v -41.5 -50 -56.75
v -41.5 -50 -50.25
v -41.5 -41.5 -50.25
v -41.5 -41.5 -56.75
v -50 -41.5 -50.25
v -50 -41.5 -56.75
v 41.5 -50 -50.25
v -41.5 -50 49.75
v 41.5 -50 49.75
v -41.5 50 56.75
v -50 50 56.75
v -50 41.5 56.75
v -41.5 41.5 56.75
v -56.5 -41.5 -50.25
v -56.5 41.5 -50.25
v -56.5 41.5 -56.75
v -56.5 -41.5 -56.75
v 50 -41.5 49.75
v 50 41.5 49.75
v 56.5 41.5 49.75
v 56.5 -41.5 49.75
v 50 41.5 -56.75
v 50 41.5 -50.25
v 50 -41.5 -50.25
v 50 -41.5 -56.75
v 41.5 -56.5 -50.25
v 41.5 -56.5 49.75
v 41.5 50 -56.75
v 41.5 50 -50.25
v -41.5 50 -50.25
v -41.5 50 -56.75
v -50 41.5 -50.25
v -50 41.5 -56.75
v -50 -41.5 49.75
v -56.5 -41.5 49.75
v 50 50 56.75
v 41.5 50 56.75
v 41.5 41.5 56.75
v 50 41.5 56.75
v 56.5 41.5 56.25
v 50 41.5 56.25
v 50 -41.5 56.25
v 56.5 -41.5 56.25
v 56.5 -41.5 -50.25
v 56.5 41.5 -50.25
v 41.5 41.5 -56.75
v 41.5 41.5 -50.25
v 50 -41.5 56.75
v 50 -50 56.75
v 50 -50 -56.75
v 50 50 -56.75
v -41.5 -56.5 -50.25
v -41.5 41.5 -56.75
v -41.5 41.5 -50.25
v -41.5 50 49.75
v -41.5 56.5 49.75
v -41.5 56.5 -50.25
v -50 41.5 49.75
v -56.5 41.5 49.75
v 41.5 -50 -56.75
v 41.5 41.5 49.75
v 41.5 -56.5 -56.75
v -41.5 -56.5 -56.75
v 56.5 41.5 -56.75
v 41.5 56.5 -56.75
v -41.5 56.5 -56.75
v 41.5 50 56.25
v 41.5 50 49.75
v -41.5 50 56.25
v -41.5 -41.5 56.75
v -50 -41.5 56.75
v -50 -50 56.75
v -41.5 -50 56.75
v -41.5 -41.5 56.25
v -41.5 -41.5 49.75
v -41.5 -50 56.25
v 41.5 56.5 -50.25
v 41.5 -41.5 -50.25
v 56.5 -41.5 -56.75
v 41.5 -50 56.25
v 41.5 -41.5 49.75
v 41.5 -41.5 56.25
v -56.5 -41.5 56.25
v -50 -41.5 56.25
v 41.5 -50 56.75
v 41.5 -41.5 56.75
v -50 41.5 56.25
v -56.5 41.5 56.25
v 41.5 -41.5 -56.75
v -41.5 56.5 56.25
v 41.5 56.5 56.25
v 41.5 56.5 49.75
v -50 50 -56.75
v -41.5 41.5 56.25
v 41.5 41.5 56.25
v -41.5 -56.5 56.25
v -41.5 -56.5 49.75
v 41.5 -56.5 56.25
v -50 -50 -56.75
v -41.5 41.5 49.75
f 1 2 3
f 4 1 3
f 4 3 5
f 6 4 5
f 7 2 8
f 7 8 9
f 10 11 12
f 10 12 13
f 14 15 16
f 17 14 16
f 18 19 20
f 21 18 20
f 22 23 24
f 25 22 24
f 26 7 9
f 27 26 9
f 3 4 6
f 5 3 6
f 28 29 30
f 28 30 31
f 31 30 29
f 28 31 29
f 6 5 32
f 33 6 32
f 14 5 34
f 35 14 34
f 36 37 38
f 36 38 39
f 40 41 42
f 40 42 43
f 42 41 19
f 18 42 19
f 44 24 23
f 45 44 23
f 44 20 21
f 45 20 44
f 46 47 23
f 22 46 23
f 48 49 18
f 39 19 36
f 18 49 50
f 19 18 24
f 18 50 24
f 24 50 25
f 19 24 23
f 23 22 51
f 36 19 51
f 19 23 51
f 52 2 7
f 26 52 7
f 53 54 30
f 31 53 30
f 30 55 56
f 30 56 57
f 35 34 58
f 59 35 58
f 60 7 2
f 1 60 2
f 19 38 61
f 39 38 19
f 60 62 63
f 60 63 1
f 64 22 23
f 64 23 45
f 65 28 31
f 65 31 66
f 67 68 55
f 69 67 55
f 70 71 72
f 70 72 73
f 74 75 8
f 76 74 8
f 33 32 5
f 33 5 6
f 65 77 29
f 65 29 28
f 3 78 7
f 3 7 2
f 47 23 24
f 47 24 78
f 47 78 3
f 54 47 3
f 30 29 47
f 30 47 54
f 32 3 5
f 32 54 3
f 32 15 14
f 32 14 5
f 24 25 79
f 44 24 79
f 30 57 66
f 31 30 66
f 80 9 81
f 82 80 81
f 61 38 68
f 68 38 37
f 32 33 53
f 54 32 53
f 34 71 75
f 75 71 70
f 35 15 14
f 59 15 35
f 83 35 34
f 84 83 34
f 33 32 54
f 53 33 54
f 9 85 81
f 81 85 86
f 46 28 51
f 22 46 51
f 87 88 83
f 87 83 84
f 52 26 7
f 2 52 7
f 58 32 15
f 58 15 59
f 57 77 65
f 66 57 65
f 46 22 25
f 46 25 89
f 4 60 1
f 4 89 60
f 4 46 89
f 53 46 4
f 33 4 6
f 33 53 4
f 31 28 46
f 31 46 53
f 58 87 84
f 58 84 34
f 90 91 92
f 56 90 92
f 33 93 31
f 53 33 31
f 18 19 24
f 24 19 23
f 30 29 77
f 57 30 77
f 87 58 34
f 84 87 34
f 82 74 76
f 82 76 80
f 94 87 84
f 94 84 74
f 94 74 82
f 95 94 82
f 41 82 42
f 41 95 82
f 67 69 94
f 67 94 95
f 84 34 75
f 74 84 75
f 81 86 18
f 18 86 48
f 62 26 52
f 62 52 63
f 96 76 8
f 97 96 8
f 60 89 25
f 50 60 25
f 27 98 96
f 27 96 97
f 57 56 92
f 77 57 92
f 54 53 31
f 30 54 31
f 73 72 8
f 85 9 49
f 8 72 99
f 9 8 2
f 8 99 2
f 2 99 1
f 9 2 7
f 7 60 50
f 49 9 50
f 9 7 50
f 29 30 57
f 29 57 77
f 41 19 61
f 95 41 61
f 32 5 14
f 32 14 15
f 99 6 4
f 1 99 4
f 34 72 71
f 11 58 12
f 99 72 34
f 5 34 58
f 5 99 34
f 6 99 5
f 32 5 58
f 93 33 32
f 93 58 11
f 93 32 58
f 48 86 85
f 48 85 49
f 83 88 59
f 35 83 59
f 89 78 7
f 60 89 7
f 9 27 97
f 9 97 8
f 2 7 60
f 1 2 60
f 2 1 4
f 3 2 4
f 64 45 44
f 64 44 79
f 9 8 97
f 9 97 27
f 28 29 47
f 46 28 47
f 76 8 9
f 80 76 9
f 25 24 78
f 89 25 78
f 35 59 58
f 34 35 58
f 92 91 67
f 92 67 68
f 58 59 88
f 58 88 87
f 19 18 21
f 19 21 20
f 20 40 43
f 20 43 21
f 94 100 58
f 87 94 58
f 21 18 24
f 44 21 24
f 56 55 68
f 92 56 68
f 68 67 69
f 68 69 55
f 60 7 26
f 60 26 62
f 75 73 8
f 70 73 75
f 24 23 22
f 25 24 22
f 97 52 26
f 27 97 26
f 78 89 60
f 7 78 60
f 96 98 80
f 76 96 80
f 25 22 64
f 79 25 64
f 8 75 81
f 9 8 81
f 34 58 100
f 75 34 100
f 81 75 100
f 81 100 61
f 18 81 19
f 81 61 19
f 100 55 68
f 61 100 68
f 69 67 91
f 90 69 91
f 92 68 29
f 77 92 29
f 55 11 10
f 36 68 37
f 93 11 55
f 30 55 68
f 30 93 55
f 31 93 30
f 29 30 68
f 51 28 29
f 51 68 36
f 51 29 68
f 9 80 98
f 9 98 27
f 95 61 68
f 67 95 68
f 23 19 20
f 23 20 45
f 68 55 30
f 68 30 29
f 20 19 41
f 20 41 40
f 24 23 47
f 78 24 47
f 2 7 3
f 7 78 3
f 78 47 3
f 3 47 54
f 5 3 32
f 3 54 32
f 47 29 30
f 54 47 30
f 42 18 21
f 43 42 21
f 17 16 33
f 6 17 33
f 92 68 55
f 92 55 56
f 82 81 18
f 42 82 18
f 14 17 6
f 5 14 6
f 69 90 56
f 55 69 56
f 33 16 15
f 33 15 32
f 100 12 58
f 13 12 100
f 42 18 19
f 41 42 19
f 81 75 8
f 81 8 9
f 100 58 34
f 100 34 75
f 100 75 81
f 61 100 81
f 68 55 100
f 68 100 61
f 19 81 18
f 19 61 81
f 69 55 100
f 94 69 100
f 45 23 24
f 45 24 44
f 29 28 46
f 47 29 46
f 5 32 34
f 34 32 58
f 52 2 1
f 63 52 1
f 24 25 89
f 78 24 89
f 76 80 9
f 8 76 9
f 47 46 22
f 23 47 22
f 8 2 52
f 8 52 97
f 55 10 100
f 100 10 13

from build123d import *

# Parameters (mm, degrees)
BOSS_EXTRUDE1_DEPTH      = 56.75
BOSS_EXTRUDE1_DEPTH_BACK = 56.75
SKETCH1_W                = 100
SKETCH1_H                = 100
SKETCH3_W                = 83
SKETCH3_H                = 83
SKETCH3_H_2              = 8.5
SKETCH3_W_2              = 8.5
CUT_EXTRUDE1_DEPTH       = 7
CUT_EXTRUDE2_DEPTH       = 6.5
SKETCH5_W                = 100
SKETCH5_H                = 83
BOSS_EXTRUDE2_DEPTH      = 6.5
SKETCH6_W                = 83
SKETCH6_H                = 100
BOSS_EXTRUDE3_DEPTH      = 6.5
SKETCH7_W                = 100
SKETCH7_H                = 83
BOSS_EXTRUDE4_DEPTH      = 6.5
BOSS_EXTRUDE5_DEPTH      = 6.5
BOSS_EXTRUDE6_DEPTH      = 6.5
SKETCH11_W               = 83
SKETCH11_H               = 100
BOSS_EXTRUDE7_DEPTH      = 6.5
SKETCH15_W               = 6.5
SKETCH15_H               = 6.5
BOSS_EXTRUDE10_DEPTH     = 83
BOSS_EXTRUDE10_2_DEPTH   = 83
BOSS_EXTRUDE10_3_DEPTH   = 83
BOSS_EXTRUDE10_4_DEPTH   = 83
SKETCH16_W               = 6.5
SKETCH16_H               = 6.5
BOSS_EXTRUDE11_DEPTH     = 83
BOSS_EXTRUDE11_2_DEPTH   = 83
BOSS_EXTRUDE11_3_DEPTH   = 83
BOSS_EXTRUDE11_4_DEPTH   = 83


with BuildPart() as part:
    # Sketch1 → Boss-Extrude1 (new, two sides: drawn at the far end of the back side and taken through both)
    with BuildSketch(Plane.XY.offset(-BOSS_EXTRUDE1_DEPTH_BACK)):
        Rectangle(SKETCH1_W, SKETCH1_H)
    extrude(amount=BOSS_EXTRUDE1_DEPTH + BOSS_EXTRUDE1_DEPTH_BACK)

    # Sketch3 → Cut-Extrude1 (cut)
    with BuildSketch(Plane.XY.offset(56.75)):
        Rectangle(SKETCH3_W, SKETCH3_H)
        with Locations((0, 45.75)):
            Rectangle(SKETCH3_W, SKETCH3_H_2)
        with Locations((-45.75, 0)):
            Rectangle(SKETCH3_W_2, SKETCH3_H)
        with Locations((0, -45.75)):
            Rectangle(SKETCH3_W, SKETCH3_H_2)
        with Locations((45.75, 0)):
            Rectangle(SKETCH3_W_2, SKETCH3_H)
    extrude(amount=-CUT_EXTRUDE1_DEPTH, mode=Mode.SUBTRACT)

    # Sketch4 → Cut-Extrude2 (cut)
    with BuildSketch(Plane(origin=(0, 0, -56.75), x_dir=(-1, 0, 0), z_dir=(0, 0, -1))):
        Polygon((-41.5, -41.5), (-41.5, -50), (41.5, -50), (41.5, -41.5), (50, -41.5), (50, 41.5), (41.5, 41.5), (41.5, 50), (-41.5, 50), (-41.5, 41.5), (-50, 41.5), (-50, -41.5), align=None)
    extrude(amount=-CUT_EXTRUDE2_DEPTH, mode=Mode.SUBTRACT)


with BuildPart() as body_2:
    # Sketch5 → Boss-Extrude2 (new body)
    with BuildSketch(Plane.ZY.offset(50)):
        with Locations((-0.25, 0)):
            Rectangle(SKETCH5_W, SKETCH5_H)
    extrude(amount=BOSS_EXTRUDE2_DEPTH)


with BuildPart() as body_3:
    # Sketch6 → Boss-Extrude3 (new body)
    with BuildSketch(Plane(origin=(0, 50, 0), x_dir=(1, 0, 0), z_dir=(0, 1, 0))):
        with Locations((0, 0.25)):
            Rectangle(SKETCH6_W, SKETCH6_H)
    extrude(amount=BOSS_EXTRUDE3_DEPTH)


with BuildPart() as body_4:
    # Sketch7 → Boss-Extrude4 (new body)
    with BuildSketch(Plane(origin=(50, 0, 0), x_dir=(0, 0, -1), z_dir=(1, 0, 0))):
        with Locations((0.25, 0)):
            Rectangle(SKETCH7_W, SKETCH7_H)
    extrude(amount=BOSS_EXTRUDE4_DEPTH)


with BuildPart() as body_5:
    # Sketch9 → Boss-Extrude5 (new body)
    with BuildSketch(Plane.XY.offset(49.75)):
        Polygon((41.5, -50), (41.5, -41.5), (50, -41.5), (50, 41.5), (41.5, 41.5), (41.5, 50), (-41.5, 50), (-41.5, 41.5), (-50, 41.5), (-50, -41.5), (-41.5, -41.5), (-41.5, -50), align=None)
    extrude(amount=BOSS_EXTRUDE5_DEPTH)


with BuildPart() as body_6:
    # Sketch10 → Boss-Extrude6 (new body)
    with BuildSketch(Plane(origin=(0, 0, -50.25), x_dir=(-1, 0, 0), z_dir=(0, 0, -1))):
        Polygon((-41.5, -50), (41.5, -50), (41.5, -41.5), (50, -41.5), (50, 41.5), (41.5, 41.5), (41.5, 50), (-41.5, 50), (-41.5, 41.5), (-50, 41.5), (-50, -41.5), (-41.5, -41.5), align=None)
    extrude(amount=BOSS_EXTRUDE6_DEPTH)


with BuildPart() as body_7:
    # Sketch11 → Boss-Extrude7 (new body)
    with BuildSketch(Plane.XZ.offset(50)):
        with Locations((0, -0.25)):
            Rectangle(SKETCH11_W, SKETCH11_H)
    extrude(amount=BOSS_EXTRUDE7_DEPTH)


with BuildPart() as body_8:
    # Sketch15 → Boss-Extrude10 (new body)
    with BuildSketch(Plane(origin=(41.5, 0, 0), x_dir=(0, 0, -1), z_dir=(1, 0, 0))):
        with Locations((53.5, 53.25)):
            Rectangle(SKETCH15_W, SKETCH15_H)
    extrude(amount=-BOSS_EXTRUDE10_DEPTH)


with BuildPart() as body_9:
    # Sketch15 → Boss-Extrude10 2 (new body)
    with BuildSketch(Plane(origin=(41.5, 0, 0), x_dir=(0, 0, -1), z_dir=(1, 0, 0))):
        with Locations((53.5, -53.25)):
            Rectangle(SKETCH15_W, SKETCH15_H)
    extrude(amount=-BOSS_EXTRUDE10_2_DEPTH)


with BuildPart() as body_10:
    # Sketch15 → Boss-Extrude10 3 (new body)
    with BuildSketch(Plane(origin=(41.5, 0, 0), x_dir=(0, 0, -1), z_dir=(1, 0, 0))):
        with Locations((-53, -53.25)):
            Rectangle(SKETCH15_W, SKETCH15_H)
    extrude(amount=-BOSS_EXTRUDE10_3_DEPTH)


with BuildPart() as body_11:
    # Sketch15 → Boss-Extrude10 4 (new body)
    with BuildSketch(Plane(origin=(41.5, 0, 0), x_dir=(0, 0, -1), z_dir=(1, 0, 0))):
        with Locations((-53, 53.25)):
            Rectangle(SKETCH15_W, SKETCH15_H)
    extrude(amount=-BOSS_EXTRUDE10_4_DEPTH)


with BuildPart() as body_12:
    # Sketch16 → Boss-Extrude11 (new body)
    with BuildSketch(Plane(origin=(0, 41.5, 0), x_dir=(1, 0, 0), z_dir=(0, 1, 0))):
        with Locations((53.25, 53.5)):
            Rectangle(SKETCH16_W, SKETCH16_H)
    extrude(amount=-BOSS_EXTRUDE11_DEPTH)


with BuildPart() as body_13:
    # Sketch16 → Boss-Extrude11 2 (new body)
    with BuildSketch(Plane(origin=(0, 41.5, 0), x_dir=(1, 0, 0), z_dir=(0, 1, 0))):
        with Locations((-53.25, 53.5)):
            Rectangle(SKETCH16_W, SKETCH16_H)
    extrude(amount=-BOSS_EXTRUDE11_2_DEPTH)


with BuildPart() as body_14:
    # Sketch16 → Boss-Extrude11 3 (new body)
    with BuildSketch(Plane(origin=(0, 41.5, 0), x_dir=(1, 0, 0), z_dir=(0, 1, 0))):
        with Locations((-53.25, -53)):
            Rectangle(SKETCH16_W, SKETCH16_H)
    extrude(amount=-BOSS_EXTRUDE11_3_DEPTH)


with BuildPart() as body_15:
    # Sketch16 → Boss-Extrude11 4 (new body)
    with BuildSketch(Plane(origin=(0, 41.5, 0), x_dir=(1, 0, 0), z_dir=(0, 1, 0))):
        with Locations((53.25, -53)):
            Rectangle(SKETCH16_W, SKETCH16_H)
    extrude(amount=-BOSS_EXTRUDE11_4_DEPTH)


solid = Compound([part.part, body_2.part, body_3.part, body_4.part, body_5.part, body_6.part, body_7.part, body_8.part, body_9.part, body_10.part, body_11.part, body_12.part, body_13.part, body_14.part, body_15.part])
